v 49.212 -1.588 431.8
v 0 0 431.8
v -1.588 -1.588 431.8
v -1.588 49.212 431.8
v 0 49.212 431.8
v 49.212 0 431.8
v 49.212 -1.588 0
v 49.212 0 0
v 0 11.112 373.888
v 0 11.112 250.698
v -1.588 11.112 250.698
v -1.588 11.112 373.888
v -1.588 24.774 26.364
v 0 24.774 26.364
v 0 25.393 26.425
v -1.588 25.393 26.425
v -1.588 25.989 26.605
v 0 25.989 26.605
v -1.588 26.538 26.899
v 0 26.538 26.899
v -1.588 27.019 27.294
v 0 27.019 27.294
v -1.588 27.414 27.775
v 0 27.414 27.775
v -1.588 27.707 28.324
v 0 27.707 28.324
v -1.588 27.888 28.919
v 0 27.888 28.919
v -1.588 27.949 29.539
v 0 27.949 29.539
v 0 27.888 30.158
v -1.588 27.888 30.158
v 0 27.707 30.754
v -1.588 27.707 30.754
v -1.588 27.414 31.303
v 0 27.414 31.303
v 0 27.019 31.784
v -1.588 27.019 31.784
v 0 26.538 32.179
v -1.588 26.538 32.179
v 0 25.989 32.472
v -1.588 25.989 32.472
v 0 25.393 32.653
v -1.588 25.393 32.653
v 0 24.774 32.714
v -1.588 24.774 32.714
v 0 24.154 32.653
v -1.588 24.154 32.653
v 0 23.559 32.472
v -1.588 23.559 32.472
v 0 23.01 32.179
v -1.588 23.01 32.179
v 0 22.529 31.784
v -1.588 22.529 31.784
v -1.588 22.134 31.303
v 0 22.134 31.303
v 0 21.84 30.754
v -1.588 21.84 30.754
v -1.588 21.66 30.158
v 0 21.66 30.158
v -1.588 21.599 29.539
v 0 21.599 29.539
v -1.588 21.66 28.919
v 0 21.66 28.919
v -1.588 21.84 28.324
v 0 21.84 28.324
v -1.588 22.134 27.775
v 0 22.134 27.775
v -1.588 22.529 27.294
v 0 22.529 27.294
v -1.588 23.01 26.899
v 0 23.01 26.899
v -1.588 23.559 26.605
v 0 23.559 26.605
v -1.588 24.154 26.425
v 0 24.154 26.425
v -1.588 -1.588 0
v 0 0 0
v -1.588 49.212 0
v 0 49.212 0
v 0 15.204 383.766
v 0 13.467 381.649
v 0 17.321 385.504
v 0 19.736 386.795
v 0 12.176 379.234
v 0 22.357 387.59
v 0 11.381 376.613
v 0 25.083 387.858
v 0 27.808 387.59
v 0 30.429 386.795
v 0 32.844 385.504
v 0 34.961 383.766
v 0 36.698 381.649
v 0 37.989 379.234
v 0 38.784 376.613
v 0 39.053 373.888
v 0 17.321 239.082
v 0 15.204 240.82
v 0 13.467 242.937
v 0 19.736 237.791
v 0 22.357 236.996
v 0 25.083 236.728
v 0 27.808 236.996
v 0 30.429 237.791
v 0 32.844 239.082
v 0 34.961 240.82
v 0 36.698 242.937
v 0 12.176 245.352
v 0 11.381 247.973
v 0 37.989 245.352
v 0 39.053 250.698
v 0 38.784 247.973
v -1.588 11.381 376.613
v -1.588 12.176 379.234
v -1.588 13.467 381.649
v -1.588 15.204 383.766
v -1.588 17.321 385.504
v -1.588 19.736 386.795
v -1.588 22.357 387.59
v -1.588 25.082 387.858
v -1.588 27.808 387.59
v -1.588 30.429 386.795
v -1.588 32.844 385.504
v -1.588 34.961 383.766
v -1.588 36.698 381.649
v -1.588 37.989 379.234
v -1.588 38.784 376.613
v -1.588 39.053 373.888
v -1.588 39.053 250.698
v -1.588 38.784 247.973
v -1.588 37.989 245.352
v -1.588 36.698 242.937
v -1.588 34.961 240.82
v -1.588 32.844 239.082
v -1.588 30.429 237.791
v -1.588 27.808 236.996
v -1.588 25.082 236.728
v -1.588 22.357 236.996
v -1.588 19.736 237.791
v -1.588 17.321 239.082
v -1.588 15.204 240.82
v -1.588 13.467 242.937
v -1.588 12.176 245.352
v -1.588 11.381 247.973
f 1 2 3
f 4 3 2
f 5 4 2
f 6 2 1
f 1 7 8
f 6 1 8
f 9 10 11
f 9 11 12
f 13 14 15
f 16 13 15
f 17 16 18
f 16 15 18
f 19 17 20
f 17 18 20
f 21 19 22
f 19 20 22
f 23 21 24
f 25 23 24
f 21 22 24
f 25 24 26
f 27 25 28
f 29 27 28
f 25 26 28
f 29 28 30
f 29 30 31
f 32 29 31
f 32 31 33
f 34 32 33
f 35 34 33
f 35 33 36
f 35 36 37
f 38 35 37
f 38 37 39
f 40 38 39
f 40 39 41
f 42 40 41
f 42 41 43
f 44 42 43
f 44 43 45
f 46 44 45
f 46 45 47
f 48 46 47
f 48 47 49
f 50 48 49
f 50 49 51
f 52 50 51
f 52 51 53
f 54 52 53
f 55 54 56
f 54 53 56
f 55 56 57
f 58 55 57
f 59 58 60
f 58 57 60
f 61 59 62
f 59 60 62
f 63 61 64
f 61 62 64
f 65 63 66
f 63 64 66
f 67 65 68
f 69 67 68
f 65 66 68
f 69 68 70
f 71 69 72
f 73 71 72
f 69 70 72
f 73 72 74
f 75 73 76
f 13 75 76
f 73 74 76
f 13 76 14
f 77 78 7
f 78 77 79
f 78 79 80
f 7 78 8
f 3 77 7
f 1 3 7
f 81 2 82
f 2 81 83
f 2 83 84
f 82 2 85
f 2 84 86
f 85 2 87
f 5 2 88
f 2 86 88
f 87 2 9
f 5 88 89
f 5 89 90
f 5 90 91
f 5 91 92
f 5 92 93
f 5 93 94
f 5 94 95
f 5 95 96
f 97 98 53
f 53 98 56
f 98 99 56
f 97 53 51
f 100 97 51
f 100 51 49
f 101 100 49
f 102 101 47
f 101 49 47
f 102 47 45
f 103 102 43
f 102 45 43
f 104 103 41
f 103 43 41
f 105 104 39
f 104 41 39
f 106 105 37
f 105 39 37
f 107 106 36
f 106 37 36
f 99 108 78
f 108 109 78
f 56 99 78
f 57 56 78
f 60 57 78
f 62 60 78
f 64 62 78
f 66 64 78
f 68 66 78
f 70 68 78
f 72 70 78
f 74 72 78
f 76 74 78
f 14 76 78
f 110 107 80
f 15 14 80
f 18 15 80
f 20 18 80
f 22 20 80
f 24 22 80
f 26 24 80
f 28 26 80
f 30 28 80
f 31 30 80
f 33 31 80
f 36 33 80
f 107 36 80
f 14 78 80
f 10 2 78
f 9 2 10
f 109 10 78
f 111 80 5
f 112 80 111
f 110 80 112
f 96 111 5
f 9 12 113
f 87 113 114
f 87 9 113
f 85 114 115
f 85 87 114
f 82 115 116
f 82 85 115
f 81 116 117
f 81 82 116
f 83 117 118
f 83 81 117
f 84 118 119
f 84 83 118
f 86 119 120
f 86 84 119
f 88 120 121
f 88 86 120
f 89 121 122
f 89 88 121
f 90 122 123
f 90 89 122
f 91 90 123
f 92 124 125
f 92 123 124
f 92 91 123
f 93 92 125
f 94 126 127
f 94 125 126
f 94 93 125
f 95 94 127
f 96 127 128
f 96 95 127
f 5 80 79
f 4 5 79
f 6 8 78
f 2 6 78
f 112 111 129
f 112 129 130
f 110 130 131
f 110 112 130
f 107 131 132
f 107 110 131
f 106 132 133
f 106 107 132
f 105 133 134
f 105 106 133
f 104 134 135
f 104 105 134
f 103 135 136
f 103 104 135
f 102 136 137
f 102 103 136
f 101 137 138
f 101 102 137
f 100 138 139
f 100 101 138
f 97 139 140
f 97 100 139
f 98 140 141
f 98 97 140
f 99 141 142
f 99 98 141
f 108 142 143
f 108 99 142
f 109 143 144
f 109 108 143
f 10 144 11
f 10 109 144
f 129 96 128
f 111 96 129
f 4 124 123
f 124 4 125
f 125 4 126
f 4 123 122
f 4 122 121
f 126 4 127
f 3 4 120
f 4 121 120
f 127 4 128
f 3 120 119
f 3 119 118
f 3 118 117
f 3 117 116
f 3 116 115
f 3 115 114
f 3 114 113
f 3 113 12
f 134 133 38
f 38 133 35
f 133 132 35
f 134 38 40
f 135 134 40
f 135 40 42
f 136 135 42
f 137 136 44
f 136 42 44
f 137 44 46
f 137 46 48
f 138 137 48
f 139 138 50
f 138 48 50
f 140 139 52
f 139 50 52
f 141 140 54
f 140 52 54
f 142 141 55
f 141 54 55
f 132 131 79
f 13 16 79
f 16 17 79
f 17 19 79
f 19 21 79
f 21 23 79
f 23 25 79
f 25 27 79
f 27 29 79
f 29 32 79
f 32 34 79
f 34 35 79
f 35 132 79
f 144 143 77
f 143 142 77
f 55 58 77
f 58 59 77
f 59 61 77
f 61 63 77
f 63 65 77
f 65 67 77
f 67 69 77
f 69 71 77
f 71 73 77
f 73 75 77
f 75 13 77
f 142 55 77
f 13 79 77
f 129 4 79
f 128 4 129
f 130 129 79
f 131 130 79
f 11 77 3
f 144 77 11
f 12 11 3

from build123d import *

# Parameters (mm, degrees)
BOSS_EXTRUDE2_DEPTH = 431.8
CUT_EXTRUDE3_DEPTH  = 127
SKETCH7_R           = 3.175
CUT_EXTRUDE4_DEPTH  = 127


with BuildPart() as part:
    # Sketch3 → Boss-Extrude2 (new body)
    with BuildSketch(Plane.XY):
        Polygon((0, 0), (0, 49.2125), (-1.5875, 49.2125), (-1.5875, -1.5875), (49.2125, -1.5875), (49.2125, 0), align=None)
    extrude(amount=BOSS_EXTRUDE2_DEPTH)

    # Sketch6 → Cut-Extrude3 (cut)
    with BuildSketch(Plane(origin=(0, 0, 0), x_dir=(0, 0, -1), z_dir=(1, 0, 0))):
        with BuildLine():
            Line((-373.888, 39.0525), (-250.698, 39.0525))
            ThreePointArc((-250.698, 39.0525), (-236.728, 25.0825), (-250.698, 11.1125))
            Line((-250.698, 11.1125), (-373.888, 11.1125))
            ThreePointArc((-373.888, 11.1125), (-387.858, 25.0825), (-373.888, 39.0525))
        make_face()
    extrude(amount=-CUT_EXTRUDE3_DEPTH, mode=Mode.SUBTRACT)

    # Sketch7 → Cut-Extrude4 (cut)
    with BuildSketch(Plane(origin=(0, 0, 0), x_dir=(0, 0, -1), z_dir=(1, 0, 0))):
        with Locations((-29.538792285, 24.773594829)):
            Circle(SKETCH7_R)
    extrude(amount=-CUT_EXTRUDE4_DEPTH, mode=Mode.SUBTRACT)


solid = part.part
